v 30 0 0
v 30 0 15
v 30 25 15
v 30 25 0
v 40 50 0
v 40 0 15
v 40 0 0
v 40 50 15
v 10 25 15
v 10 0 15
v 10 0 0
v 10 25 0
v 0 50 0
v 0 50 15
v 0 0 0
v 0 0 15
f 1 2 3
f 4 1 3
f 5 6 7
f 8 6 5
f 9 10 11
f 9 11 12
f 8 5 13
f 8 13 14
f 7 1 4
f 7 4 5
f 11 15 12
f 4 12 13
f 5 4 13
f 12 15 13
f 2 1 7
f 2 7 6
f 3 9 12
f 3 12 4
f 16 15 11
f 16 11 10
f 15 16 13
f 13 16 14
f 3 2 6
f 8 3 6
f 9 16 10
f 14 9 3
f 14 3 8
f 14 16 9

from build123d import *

# Parameters (mm, degrees)
F0_W     = 50
F0_H     = 15
F1_DEPTH = 40
F2_W     = 20
F2_H     = 25
F3_DEPTH = 25


with BuildPart() as f1:
    # F0 (on Right) → F1 (new body)
    with BuildSketch(Plane.YZ):
        with Locations((25, 7.5)):
            Rectangle(F0_W, F0_H)
    extrude(amount=F1_DEPTH)

    # F2 (on face) → F3 (cut)
    with BuildSketch(Plane.XY.offset(15)):
        with Locations((20, 12.5)):
            Rectangle(F2_W, F2_H)
    extrude(amount=-F3_DEPTH, mode=Mode.SUBTRACT)


solid = f1.part
